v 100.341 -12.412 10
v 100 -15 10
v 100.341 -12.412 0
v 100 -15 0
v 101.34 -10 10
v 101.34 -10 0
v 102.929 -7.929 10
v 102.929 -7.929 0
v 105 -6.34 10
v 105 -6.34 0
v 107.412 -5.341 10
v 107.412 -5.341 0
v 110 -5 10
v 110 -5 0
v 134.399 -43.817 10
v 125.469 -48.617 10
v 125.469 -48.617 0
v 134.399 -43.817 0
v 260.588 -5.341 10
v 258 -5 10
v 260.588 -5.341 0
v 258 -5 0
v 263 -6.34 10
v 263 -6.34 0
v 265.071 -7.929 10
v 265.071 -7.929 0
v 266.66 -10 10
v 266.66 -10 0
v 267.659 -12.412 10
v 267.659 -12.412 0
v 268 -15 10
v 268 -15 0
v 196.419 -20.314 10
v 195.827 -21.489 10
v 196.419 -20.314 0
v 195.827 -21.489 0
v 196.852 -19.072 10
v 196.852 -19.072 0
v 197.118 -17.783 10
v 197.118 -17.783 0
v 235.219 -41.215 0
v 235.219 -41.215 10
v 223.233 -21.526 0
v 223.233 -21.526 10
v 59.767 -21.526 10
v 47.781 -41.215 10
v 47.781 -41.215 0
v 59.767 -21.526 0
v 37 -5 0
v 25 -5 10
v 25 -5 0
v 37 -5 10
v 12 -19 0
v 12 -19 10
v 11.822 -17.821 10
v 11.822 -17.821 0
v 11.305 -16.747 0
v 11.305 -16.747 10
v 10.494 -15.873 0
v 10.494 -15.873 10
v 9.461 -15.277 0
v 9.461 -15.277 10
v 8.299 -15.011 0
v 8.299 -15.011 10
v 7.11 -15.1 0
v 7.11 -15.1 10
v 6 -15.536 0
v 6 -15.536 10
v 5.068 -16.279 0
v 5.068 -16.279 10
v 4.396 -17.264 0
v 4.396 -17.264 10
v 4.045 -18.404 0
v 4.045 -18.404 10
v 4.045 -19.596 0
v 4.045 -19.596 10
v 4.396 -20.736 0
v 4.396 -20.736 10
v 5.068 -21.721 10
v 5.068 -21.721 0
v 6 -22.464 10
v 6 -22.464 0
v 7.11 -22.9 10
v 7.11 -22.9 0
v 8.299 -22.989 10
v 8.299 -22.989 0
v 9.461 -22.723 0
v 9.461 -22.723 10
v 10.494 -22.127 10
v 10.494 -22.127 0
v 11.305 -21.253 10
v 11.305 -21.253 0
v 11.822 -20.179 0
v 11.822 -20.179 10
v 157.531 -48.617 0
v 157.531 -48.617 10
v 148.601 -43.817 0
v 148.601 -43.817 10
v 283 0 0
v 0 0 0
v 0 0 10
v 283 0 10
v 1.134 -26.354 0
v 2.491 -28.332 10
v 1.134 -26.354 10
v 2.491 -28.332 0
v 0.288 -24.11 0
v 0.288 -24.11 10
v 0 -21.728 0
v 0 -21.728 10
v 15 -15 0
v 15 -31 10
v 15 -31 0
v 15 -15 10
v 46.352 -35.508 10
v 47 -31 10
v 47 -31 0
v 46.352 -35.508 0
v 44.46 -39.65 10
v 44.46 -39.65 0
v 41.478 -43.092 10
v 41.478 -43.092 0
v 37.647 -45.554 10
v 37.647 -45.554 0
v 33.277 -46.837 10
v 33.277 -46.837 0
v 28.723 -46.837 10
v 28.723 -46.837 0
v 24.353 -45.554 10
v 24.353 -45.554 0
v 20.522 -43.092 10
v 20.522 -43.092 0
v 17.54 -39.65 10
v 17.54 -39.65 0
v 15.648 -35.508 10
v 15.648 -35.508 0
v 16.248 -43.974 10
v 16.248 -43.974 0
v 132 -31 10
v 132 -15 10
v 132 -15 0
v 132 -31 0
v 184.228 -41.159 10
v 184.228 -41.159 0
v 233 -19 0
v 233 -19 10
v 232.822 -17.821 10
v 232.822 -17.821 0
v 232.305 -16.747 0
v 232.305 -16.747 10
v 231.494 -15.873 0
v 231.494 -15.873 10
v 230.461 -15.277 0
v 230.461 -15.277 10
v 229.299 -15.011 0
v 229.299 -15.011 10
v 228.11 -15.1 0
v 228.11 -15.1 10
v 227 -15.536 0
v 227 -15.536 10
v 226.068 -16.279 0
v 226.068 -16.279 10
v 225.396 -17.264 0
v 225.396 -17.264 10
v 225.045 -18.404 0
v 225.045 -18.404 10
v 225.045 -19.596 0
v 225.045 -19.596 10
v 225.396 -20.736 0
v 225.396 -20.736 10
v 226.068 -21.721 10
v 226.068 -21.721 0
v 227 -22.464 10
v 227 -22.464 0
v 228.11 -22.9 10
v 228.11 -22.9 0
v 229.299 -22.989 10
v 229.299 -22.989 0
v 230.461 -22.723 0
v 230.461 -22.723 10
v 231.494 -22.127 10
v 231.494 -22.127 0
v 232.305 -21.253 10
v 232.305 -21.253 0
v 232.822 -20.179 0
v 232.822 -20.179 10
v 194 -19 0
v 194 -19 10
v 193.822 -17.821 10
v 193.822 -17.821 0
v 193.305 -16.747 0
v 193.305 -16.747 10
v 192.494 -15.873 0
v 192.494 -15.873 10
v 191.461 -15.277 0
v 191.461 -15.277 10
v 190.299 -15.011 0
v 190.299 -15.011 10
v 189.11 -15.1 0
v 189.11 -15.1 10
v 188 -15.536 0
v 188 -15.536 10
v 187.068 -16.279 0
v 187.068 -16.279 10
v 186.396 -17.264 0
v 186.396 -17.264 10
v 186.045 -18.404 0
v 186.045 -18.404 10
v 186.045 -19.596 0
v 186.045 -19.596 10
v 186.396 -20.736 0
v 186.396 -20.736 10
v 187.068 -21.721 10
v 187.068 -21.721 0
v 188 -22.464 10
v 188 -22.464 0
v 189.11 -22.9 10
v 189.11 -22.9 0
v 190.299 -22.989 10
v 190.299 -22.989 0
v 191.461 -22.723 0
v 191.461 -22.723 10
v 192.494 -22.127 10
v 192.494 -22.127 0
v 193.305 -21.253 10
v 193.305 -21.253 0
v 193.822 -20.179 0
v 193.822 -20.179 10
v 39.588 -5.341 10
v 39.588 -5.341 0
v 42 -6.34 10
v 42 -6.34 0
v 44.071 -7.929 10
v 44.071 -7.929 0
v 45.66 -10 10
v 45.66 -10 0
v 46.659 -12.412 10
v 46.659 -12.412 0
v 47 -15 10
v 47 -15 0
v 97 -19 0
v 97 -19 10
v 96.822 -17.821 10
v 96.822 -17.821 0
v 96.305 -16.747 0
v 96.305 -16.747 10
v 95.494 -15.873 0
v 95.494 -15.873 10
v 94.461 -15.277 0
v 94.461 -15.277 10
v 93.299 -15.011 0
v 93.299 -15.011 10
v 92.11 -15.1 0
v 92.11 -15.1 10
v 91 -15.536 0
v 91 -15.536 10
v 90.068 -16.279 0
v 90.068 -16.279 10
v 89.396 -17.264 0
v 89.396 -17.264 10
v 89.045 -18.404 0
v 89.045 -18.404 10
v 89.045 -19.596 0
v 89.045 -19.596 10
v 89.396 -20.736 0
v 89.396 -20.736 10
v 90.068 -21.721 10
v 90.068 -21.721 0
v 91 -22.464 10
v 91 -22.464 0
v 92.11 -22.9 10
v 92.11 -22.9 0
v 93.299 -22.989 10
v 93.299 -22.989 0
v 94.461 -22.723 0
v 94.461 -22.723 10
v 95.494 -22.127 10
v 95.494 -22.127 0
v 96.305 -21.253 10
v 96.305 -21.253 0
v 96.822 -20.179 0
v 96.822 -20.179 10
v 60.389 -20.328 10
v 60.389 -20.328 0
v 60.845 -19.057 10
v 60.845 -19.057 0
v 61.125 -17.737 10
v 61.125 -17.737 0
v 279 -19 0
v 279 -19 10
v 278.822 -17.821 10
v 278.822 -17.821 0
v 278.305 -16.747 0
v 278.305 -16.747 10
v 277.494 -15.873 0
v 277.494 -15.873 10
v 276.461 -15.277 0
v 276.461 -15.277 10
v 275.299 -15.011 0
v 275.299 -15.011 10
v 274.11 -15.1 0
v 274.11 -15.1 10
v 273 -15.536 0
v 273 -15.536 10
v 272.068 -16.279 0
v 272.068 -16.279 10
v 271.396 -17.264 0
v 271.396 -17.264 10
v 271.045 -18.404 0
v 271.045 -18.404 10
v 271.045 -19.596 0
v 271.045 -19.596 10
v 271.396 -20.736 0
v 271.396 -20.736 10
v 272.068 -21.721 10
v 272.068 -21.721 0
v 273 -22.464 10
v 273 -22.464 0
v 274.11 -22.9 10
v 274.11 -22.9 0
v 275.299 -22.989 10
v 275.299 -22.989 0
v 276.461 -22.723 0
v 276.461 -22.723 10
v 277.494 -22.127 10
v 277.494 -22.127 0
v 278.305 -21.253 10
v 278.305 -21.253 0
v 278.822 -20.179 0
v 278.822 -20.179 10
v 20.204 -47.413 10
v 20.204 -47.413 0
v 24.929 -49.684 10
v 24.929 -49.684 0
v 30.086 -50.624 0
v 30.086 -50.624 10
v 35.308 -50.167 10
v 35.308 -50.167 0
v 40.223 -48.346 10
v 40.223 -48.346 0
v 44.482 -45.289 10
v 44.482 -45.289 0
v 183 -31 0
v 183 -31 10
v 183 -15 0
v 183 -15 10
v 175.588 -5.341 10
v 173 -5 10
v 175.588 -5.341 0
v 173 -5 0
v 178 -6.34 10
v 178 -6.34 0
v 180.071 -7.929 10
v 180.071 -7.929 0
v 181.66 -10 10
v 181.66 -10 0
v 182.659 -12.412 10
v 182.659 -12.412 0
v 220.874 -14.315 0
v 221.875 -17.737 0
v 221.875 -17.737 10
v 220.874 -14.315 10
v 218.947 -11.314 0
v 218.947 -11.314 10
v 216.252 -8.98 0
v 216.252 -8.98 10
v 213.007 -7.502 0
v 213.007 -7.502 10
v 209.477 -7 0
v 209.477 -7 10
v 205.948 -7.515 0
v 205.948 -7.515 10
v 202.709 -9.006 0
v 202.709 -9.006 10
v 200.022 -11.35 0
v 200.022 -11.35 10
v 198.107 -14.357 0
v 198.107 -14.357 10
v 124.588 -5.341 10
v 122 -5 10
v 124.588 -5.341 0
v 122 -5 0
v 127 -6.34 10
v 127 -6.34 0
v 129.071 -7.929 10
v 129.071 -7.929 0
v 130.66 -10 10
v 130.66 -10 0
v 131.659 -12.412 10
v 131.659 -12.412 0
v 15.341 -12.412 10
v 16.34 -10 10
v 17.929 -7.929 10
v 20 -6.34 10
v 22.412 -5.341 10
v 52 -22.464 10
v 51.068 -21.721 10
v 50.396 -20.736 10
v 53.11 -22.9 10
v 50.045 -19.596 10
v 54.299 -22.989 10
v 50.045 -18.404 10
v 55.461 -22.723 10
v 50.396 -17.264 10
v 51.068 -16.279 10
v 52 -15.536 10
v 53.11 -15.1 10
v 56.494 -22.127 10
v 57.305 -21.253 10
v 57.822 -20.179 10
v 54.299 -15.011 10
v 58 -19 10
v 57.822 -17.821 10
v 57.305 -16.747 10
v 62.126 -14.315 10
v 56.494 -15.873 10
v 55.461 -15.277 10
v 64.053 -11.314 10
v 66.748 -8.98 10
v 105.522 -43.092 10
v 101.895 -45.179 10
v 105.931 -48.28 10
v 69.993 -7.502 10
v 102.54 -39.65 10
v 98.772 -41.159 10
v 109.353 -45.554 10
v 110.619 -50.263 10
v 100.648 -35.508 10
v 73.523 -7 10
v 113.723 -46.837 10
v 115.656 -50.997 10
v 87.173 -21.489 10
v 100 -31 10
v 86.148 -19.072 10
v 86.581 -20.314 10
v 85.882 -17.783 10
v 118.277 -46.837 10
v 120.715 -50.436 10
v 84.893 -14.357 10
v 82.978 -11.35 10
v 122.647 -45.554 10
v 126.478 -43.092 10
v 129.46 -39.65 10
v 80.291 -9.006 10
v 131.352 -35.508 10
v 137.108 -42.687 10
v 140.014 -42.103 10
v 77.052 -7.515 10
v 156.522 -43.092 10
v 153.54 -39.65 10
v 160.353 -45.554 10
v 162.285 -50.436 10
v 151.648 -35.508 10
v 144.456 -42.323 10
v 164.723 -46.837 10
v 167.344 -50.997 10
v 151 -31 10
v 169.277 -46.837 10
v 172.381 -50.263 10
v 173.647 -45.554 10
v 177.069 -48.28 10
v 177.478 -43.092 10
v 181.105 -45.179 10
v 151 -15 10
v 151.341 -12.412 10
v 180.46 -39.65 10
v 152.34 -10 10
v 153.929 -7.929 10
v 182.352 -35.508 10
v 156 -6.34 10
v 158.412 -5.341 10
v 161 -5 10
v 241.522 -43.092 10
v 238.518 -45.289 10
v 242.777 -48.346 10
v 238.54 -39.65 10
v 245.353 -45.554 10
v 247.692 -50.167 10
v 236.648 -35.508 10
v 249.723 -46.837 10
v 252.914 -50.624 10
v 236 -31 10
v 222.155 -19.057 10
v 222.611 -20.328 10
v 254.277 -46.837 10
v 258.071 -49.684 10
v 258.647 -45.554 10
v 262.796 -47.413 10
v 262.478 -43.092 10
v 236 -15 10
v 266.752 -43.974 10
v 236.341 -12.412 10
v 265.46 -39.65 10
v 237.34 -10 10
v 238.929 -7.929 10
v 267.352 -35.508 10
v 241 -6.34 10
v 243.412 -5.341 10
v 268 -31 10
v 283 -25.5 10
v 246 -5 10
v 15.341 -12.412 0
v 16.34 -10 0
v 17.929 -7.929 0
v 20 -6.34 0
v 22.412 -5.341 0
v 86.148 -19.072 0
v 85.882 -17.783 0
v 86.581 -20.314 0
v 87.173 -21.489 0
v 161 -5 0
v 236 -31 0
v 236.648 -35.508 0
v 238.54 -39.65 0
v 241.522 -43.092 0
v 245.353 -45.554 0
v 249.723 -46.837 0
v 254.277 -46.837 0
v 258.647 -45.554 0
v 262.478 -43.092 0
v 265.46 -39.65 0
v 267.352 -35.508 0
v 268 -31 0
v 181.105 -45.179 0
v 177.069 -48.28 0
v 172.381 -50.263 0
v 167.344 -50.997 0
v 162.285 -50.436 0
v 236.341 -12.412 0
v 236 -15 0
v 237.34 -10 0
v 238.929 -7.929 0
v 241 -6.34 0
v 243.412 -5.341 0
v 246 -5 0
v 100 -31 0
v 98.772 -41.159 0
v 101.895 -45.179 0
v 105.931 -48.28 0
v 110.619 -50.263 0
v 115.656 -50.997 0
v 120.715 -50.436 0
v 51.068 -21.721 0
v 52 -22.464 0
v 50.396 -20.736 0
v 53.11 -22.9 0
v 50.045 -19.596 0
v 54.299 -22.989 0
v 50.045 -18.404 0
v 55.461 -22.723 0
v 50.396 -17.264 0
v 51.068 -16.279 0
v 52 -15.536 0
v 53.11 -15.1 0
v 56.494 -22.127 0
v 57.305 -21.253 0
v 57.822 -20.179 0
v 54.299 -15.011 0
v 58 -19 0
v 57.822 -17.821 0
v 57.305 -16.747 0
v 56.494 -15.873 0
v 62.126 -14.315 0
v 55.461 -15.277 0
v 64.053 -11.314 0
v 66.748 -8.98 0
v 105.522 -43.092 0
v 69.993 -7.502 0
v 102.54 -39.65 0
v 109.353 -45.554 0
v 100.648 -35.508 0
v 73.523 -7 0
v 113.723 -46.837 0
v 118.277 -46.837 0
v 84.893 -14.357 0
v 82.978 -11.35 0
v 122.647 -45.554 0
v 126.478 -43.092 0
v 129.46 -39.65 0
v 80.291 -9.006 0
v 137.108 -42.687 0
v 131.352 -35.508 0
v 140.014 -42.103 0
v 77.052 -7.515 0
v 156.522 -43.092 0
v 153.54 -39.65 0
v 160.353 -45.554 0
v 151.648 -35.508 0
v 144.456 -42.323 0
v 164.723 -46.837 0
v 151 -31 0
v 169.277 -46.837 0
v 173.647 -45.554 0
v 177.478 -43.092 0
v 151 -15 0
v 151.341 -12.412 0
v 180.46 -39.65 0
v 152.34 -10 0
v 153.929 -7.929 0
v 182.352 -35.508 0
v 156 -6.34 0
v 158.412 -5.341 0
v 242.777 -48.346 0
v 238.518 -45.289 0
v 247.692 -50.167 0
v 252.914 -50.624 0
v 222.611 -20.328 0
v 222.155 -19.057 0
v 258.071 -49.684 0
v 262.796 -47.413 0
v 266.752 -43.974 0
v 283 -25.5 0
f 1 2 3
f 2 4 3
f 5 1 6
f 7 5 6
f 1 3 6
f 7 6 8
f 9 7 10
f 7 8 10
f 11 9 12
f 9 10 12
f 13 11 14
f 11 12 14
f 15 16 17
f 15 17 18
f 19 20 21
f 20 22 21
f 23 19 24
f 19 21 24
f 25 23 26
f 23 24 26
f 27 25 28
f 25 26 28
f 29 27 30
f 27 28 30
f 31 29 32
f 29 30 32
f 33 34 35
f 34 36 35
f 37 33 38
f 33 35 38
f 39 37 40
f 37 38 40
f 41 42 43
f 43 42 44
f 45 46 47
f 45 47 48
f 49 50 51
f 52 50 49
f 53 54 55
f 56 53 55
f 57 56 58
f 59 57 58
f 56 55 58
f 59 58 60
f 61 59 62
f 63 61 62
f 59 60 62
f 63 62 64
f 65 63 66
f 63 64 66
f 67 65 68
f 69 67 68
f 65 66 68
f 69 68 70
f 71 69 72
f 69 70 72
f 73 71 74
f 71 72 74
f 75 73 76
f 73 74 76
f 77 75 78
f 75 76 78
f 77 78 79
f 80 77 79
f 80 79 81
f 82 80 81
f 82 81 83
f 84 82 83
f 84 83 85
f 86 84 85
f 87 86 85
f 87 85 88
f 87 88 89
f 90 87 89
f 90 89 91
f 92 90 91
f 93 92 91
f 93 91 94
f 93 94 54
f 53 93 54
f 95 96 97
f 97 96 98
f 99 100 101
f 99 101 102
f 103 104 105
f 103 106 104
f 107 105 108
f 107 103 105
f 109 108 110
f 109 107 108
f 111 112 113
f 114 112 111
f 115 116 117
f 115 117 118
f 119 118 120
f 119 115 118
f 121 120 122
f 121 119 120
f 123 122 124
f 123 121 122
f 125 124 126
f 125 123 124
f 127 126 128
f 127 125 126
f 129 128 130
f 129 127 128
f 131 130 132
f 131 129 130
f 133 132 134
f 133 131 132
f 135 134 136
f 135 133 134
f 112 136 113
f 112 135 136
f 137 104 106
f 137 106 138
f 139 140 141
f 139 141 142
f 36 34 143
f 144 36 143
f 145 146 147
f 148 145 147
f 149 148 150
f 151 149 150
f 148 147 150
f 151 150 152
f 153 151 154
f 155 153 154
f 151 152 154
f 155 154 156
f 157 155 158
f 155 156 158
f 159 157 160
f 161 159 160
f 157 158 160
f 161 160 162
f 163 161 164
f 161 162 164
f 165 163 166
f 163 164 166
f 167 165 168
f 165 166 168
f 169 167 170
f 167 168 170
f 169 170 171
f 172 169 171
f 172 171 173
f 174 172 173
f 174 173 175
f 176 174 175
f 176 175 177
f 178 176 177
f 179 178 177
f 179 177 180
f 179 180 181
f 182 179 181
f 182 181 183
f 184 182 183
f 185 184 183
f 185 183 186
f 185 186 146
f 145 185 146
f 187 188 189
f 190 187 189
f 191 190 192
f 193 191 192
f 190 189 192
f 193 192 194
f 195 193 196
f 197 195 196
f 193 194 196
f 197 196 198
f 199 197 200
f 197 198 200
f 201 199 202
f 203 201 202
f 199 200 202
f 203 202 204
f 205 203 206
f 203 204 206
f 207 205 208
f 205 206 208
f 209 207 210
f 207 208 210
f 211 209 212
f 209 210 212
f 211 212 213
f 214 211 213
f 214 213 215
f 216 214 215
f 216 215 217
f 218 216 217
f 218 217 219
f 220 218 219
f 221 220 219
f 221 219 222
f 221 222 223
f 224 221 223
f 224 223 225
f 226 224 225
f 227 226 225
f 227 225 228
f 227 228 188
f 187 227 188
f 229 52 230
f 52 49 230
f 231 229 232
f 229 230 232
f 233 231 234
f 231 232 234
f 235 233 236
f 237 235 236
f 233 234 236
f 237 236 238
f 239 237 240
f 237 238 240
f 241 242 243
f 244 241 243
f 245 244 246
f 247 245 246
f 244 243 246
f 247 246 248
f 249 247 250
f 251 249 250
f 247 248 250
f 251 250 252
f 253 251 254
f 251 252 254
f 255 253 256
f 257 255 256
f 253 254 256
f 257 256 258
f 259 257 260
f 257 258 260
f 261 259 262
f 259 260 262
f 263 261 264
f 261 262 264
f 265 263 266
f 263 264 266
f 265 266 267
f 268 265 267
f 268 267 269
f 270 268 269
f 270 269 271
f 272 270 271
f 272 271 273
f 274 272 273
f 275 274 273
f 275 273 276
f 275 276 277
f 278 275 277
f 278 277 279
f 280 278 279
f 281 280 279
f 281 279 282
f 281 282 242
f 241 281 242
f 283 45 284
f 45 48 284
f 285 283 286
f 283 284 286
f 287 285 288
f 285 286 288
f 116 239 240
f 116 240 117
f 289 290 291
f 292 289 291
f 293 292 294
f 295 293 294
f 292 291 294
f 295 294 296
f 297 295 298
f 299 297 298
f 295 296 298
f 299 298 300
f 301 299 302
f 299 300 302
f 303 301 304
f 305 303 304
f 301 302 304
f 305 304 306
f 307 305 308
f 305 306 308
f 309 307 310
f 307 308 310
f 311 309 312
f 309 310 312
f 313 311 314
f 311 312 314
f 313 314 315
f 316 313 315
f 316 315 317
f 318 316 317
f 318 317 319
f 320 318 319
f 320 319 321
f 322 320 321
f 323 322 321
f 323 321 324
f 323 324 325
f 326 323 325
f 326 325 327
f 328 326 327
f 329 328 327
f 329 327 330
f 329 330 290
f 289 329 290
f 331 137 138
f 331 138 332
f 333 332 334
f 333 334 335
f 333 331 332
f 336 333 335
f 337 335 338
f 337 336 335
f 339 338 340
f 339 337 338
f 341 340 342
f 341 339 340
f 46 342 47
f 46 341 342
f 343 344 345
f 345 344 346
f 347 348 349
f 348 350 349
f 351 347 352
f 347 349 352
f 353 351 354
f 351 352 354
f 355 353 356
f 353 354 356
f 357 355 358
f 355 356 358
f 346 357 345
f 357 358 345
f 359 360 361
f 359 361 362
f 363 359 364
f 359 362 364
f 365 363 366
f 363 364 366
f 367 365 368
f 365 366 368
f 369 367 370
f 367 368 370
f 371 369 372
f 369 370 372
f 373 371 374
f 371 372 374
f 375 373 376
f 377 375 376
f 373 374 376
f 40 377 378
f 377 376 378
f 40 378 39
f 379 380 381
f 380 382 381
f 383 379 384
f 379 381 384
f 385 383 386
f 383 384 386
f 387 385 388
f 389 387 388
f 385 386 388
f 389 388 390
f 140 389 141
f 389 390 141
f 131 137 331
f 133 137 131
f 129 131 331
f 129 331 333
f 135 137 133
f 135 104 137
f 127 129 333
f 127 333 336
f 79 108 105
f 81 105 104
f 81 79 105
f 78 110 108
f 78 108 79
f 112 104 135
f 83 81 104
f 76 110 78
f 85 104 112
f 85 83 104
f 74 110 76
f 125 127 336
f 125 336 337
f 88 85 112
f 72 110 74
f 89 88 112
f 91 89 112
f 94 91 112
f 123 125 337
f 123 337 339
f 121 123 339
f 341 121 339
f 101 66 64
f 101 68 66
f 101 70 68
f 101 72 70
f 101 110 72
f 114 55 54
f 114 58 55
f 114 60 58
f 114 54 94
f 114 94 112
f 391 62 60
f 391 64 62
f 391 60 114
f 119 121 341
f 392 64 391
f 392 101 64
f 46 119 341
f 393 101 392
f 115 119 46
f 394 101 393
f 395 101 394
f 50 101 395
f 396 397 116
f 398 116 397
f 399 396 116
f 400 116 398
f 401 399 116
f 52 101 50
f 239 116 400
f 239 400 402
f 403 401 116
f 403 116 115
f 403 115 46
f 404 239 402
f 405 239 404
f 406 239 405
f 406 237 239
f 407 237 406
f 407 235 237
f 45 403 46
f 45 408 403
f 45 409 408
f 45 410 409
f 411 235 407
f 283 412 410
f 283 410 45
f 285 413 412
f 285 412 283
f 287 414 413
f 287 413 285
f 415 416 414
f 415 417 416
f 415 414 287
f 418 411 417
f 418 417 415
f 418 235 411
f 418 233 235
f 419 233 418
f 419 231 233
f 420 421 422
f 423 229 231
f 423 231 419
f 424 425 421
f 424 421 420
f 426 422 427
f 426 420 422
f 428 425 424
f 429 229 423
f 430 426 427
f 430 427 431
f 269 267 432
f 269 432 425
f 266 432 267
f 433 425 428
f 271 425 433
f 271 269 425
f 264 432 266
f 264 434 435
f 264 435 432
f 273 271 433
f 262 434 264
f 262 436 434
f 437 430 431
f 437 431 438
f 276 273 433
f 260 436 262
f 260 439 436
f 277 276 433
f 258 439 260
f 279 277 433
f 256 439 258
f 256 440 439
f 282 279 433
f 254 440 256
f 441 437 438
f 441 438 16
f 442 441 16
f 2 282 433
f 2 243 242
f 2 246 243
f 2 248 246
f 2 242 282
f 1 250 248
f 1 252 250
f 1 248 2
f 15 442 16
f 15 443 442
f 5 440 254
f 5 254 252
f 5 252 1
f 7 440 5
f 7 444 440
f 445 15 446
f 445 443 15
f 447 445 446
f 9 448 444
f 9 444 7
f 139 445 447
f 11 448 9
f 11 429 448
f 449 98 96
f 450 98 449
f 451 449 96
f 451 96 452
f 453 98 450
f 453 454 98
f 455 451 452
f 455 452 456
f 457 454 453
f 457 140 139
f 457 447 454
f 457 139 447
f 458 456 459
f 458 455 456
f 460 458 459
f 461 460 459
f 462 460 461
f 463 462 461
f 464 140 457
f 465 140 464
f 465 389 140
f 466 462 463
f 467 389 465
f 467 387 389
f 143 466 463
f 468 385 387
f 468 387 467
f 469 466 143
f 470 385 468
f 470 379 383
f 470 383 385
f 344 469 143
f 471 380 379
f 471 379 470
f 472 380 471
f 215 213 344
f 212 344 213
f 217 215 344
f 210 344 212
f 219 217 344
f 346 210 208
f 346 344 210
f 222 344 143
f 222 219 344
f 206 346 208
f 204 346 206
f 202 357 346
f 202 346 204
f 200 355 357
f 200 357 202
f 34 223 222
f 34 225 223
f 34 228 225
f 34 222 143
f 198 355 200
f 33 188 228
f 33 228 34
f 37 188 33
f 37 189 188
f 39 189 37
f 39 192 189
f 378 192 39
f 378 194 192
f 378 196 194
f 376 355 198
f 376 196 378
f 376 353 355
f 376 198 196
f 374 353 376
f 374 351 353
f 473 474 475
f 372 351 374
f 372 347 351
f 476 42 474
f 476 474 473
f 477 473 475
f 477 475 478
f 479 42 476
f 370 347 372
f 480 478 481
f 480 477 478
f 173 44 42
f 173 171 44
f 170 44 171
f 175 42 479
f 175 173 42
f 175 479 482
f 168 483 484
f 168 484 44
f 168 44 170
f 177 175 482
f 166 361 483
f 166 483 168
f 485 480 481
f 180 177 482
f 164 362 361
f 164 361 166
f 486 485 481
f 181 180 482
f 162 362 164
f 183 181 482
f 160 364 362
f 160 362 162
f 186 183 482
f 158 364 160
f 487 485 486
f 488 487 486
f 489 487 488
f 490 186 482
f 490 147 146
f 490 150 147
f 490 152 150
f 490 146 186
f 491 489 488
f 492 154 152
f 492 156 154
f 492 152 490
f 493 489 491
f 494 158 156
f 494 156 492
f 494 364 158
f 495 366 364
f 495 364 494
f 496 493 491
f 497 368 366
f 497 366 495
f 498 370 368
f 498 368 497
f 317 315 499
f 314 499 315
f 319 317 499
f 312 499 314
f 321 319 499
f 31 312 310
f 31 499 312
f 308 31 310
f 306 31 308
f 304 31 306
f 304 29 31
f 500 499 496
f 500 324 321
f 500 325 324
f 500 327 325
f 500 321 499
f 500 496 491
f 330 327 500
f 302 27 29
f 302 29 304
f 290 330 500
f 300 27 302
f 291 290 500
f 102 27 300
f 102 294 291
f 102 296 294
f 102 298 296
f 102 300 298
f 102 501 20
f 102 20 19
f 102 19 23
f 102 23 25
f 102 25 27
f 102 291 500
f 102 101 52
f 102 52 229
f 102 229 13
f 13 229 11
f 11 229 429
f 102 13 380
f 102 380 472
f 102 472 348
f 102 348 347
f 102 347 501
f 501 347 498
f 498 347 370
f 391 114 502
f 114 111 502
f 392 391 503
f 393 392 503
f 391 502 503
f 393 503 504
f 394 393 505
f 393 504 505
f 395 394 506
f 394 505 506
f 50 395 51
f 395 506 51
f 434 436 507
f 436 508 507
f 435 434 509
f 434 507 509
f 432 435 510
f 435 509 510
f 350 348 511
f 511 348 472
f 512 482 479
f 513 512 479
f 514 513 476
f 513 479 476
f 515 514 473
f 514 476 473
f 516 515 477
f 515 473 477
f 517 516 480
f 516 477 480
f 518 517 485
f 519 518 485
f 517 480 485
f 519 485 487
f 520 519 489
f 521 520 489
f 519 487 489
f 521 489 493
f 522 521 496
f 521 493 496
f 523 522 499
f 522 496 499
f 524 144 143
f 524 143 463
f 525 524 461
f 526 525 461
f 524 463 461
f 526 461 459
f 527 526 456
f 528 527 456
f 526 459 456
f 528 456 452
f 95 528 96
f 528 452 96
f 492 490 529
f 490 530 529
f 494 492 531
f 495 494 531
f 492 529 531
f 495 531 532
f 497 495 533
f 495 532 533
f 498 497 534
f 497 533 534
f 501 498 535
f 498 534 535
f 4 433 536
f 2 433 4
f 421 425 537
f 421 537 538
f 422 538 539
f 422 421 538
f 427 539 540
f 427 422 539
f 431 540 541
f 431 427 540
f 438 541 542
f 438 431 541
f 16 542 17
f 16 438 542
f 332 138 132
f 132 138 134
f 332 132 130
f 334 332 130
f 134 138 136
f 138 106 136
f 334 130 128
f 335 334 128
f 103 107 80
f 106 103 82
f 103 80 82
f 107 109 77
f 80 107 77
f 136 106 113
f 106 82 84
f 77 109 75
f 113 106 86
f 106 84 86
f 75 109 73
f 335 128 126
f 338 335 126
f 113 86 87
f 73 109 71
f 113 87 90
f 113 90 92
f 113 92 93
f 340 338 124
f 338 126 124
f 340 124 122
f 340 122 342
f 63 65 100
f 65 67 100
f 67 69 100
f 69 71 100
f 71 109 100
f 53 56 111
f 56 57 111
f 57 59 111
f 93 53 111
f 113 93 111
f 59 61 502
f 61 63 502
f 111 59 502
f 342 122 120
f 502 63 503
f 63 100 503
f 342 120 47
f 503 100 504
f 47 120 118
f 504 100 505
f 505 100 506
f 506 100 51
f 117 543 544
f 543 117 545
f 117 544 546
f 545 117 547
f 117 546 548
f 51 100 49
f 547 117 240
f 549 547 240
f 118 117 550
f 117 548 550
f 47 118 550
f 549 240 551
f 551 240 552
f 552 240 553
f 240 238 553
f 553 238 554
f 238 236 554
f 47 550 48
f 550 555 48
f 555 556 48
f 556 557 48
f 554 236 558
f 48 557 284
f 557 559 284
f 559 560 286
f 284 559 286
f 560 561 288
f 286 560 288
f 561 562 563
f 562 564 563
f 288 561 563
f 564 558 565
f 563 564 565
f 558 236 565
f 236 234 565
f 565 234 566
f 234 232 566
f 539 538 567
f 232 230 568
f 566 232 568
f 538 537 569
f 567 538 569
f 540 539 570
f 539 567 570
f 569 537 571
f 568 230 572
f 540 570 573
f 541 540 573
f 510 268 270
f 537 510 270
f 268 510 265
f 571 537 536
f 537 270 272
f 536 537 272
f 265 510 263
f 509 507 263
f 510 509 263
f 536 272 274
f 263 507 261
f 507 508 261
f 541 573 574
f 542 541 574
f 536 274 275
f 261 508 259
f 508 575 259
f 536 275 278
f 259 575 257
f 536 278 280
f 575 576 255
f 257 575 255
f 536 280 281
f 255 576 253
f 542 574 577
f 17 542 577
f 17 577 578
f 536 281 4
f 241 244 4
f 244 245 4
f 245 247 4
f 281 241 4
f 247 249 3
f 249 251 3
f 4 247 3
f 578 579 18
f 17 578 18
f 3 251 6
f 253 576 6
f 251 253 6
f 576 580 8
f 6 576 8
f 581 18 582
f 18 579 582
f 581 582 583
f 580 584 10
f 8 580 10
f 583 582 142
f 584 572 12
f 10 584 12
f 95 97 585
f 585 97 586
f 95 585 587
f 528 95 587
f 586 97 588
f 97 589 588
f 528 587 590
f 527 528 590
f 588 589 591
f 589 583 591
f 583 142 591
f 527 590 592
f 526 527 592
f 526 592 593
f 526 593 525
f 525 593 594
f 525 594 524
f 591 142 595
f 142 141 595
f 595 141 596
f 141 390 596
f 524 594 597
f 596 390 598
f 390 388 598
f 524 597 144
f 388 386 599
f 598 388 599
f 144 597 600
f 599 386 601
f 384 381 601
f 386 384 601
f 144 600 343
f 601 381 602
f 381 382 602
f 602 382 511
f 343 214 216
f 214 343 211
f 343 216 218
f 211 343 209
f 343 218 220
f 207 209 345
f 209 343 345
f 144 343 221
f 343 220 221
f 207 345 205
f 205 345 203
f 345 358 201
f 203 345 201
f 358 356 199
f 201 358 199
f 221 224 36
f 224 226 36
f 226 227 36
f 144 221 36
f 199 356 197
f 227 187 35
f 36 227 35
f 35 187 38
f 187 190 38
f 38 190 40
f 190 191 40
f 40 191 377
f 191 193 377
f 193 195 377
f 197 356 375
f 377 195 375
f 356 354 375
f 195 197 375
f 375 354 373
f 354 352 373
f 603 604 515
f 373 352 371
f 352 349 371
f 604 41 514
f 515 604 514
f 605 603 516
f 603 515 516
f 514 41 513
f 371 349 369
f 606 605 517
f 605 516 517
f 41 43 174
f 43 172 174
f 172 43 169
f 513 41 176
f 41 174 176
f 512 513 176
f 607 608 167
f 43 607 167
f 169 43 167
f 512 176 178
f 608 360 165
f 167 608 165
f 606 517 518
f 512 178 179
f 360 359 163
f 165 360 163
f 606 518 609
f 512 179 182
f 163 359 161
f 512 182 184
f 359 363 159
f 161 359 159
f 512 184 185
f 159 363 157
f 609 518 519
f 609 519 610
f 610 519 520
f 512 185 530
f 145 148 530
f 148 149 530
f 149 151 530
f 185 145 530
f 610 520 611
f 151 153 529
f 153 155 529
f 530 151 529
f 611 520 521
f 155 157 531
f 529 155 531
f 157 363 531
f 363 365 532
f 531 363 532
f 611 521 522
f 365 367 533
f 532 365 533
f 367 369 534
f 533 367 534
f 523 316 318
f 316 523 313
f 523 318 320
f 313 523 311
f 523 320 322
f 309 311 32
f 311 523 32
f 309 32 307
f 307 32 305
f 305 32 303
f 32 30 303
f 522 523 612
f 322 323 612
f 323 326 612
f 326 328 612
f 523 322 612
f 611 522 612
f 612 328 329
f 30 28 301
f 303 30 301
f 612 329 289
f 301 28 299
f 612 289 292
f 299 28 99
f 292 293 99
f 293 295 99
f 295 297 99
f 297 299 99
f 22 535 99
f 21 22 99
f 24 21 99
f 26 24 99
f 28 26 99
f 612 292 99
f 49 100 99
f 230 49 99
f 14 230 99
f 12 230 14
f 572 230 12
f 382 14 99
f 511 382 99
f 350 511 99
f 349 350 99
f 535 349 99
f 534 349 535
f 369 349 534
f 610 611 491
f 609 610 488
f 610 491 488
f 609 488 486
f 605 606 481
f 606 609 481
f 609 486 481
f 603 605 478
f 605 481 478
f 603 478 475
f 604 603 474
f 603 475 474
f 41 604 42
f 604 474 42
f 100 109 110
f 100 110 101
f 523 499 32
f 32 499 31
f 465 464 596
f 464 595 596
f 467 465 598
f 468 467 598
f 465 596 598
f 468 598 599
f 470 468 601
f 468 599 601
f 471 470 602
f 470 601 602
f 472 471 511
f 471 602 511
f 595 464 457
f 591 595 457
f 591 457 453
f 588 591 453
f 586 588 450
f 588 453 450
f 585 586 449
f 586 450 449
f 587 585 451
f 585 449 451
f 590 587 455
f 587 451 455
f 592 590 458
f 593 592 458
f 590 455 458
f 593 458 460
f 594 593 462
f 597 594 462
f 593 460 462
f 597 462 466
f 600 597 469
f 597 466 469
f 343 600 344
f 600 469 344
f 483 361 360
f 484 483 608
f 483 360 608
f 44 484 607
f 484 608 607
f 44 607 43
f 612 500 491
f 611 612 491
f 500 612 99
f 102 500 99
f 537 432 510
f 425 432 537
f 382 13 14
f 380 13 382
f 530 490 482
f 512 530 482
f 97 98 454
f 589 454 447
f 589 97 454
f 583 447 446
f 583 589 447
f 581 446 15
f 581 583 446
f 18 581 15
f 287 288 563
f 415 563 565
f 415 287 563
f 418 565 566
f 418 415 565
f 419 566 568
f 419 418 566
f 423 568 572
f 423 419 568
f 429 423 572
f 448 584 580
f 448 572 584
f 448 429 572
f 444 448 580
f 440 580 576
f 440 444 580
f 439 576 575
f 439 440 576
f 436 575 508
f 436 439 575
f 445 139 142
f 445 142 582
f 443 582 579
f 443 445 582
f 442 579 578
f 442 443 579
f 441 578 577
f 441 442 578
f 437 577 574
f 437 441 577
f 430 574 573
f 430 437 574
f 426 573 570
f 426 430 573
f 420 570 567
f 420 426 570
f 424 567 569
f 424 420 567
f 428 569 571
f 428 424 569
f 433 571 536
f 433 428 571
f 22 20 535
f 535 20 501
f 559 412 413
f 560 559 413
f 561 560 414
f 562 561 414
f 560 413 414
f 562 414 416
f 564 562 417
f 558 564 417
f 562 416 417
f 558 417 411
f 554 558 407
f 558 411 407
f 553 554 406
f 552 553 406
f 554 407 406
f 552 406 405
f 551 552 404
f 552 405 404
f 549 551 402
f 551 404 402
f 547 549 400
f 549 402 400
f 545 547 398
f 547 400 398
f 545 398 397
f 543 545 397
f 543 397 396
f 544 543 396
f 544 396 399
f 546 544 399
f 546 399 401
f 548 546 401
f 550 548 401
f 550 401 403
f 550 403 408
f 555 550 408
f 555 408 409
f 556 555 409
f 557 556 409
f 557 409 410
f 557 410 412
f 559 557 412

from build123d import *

# Parameters (mm, degrees)
CROQUIS2_W              = 283
CROQUIS2_H              = 51
SALIENTE_EXTRUIR1_DEPTH = 10
CROQUIS3_R              = 4
CORTAR_EXTRUIR1_DEPTH   = 20
REDONDEO1_R             = 10
REDONDEO2_R             = 10
CORTAR_EXTRUIR4_DEPTH   = 10
REDONDEO3_R             = 15
REDONDEO4_R             = 10


with BuildPart() as part:
    # Croquis2 → Saliente-Extruir1 (new body)
    with BuildSketch(Plane.XY):
        with Locations((141.5, -25.5)):
            Rectangle(CROQUIS2_W, CROQUIS2_H)
    extrude(amount=SALIENTE_EXTRUIR1_DEPTH)

    # Croquis3 → Cortar-Extruir1 (cut)
    with BuildSketch(Plane.XY.offset(10)):
        with Locations((8, -19)):
            Circle(CROQUIS3_R)
        with Locations((54, -19)):
            Circle(CROQUIS3_R)
        with Locations((93, -19)):
            Circle(CROQUIS3_R)
        with Locations((190, -19)):
            Circle(CROQUIS3_R)
        with Locations((229, -19)):
            Circle(CROQUIS3_R)
        with Locations((275, -19)):
            Circle(CROQUIS3_R)
        with BuildLine():
            Line((15, -31), (15, -5))
            Line((15, -5), (47, -5))
            Line((47, -5), (47, -31))
            ThreePointArc((47, -31), (31, -47), (15, -31))
        make_face()
        with BuildLine():
            Line((47.780695143, -41.215325703), (61, -19.5))
            ThreePointArc((61, -19.5), (73.5, -7), (86, -19.5))
            Line((86, -19.5), (98.77233825, -41.15911761))
            ThreePointArc((98.77233825, -41.15911761), (110.619100223, -50.262552209), (125.468650325, -48.616601858))
            Line((125.468650325, -48.616601858), (139.852321867, -40.885601446))
            Line((139.852321867, -40.885601446), (137.350385148, -76.220312807))
            Line((137.350385148, -76.220312807), (73.184426508, -72.914596395))
            Line((73.184426508, -72.914596395), (-5.481789583, -72.914596395))
            Line((-5.481789583, -72.914596395), (-5.481789583, -47.917494117))
            Line((-5.481789583, -47.917494117), (0, -25.5))
            Line((0, -25.5), (16.248287874, -43.974266764))
            ThreePointArc((16.248287874, -43.974266764), (32.712346917, -50.570704554), (47.780695143, -41.215325703))
        make_face()
        with BuildLine():
            Line((100, -31), (100, -5))
            Line((100, -5), (132, -5))
            Line((132, -5), (132, -31))
            ThreePointArc((132, -31), (116, -47), (100, -31))
        make_face()
        with BuildLine():
            Line((143.147678133, -40.885601446), (145.649614852, -76.220312807))
            Line((145.649614852, -76.220312807), (209.815573492, -72.914596395))
            Line((209.815573492, -72.914596395), (288.481789583, -72.914596395))
            Line((288.481789583, -72.914596395), (288.481789583, -47.917494117))
            Line((288.481789583, -47.917494117), (283, -25.5))
            Line((283, -25.5), (266.751712126, -43.974266764))
            ThreePointArc((266.751712126, -43.974266764), (250.287653083, -50.570704554), (235.219304857, -41.215325703))
            Line((235.219304857, -41.215325703), (222, -19.5))
            ThreePointArc((222, -19.5), (209.5, -7), (197, -19.5))
            Line((197, -19.5), (184.22766175, -41.15911761))
            ThreePointArc((184.22766175, -41.15911761), (172.380899777, -50.262552209), (157.531349675, -48.616601858))
            Line((157.531349675, -48.616601858), (143.147678133, -40.885601446))
        make_face()
        with BuildLine():
            Line((151, -5), (151, -31))
            ThreePointArc((151, -31), (167, -47), (183, -31))
            Line((183, -31), (183, -5))
            Line((183, -5), (151, -5))
        make_face()
        with BuildLine():
            Line((236, -5), (236, -31))
            ThreePointArc((236, -31), (252, -47), (268, -31))
            Line((268, -31), (268, -5))
            Line((268, -5), (236, -5))
        make_face()
    extrude(amount=-CORTAR_EXTRUIR1_DEPTH, mode=Mode.SUBTRACT)

    # Redondeo1
    redondeo1_edges = [part.edges().sort_by_distance(p)[0] for p in [
        (61, -19.5, 5),
    ]]
    fillet(redondeo1_edges, radius=REDONDEO1_R)

    # Redondeo2
    redondeo2_edges = [part.edges().sort_by_distance(p)[0] for p in [
        (0, -25.5, 5),
        (86, -19.5, 5),
        (47, -5, 5),
        (15, -5, 5),
        (132, -5, 5),
        (100, -5, 5),
    ]]
    fillet(redondeo2_edges, radius=REDONDEO2_R)

    # Croquis6 → Cortar-Extruir4 (cut)
    with BuildSketch(Plane.XY.offset(10)):
        Polygon((143.147678133, -40.885601446), (141.5, -40), (139.852321867, -40.885601446), (139.136153993, -51), (143.863846007, -51), align=None)
    extrude(amount=-CORTAR_EXTRUIR4_DEPTH, mode=Mode.SUBTRACT)

    # Redondeo3
    redondeo3_edges = [part.edges().sort_by_distance(p)[0] for p in [
        (141.5, -40, 5),
    ]]
    fillet(redondeo3_edges, radius=REDONDEO3_R)

    # Redondeo4
    redondeo4_edges = [part.edges().sort_by_distance(p)[0] for p in [
        (236, -5, 5),
        (268, -5, 5),
        (197, -19.5, 5),
        (222, -19.5, 5),
        (151, -5, 5),
        (183, -5, 5),
    ]]
    fillet(redondeo4_edges, radius=REDONDEO4_R)


solid = part.part
